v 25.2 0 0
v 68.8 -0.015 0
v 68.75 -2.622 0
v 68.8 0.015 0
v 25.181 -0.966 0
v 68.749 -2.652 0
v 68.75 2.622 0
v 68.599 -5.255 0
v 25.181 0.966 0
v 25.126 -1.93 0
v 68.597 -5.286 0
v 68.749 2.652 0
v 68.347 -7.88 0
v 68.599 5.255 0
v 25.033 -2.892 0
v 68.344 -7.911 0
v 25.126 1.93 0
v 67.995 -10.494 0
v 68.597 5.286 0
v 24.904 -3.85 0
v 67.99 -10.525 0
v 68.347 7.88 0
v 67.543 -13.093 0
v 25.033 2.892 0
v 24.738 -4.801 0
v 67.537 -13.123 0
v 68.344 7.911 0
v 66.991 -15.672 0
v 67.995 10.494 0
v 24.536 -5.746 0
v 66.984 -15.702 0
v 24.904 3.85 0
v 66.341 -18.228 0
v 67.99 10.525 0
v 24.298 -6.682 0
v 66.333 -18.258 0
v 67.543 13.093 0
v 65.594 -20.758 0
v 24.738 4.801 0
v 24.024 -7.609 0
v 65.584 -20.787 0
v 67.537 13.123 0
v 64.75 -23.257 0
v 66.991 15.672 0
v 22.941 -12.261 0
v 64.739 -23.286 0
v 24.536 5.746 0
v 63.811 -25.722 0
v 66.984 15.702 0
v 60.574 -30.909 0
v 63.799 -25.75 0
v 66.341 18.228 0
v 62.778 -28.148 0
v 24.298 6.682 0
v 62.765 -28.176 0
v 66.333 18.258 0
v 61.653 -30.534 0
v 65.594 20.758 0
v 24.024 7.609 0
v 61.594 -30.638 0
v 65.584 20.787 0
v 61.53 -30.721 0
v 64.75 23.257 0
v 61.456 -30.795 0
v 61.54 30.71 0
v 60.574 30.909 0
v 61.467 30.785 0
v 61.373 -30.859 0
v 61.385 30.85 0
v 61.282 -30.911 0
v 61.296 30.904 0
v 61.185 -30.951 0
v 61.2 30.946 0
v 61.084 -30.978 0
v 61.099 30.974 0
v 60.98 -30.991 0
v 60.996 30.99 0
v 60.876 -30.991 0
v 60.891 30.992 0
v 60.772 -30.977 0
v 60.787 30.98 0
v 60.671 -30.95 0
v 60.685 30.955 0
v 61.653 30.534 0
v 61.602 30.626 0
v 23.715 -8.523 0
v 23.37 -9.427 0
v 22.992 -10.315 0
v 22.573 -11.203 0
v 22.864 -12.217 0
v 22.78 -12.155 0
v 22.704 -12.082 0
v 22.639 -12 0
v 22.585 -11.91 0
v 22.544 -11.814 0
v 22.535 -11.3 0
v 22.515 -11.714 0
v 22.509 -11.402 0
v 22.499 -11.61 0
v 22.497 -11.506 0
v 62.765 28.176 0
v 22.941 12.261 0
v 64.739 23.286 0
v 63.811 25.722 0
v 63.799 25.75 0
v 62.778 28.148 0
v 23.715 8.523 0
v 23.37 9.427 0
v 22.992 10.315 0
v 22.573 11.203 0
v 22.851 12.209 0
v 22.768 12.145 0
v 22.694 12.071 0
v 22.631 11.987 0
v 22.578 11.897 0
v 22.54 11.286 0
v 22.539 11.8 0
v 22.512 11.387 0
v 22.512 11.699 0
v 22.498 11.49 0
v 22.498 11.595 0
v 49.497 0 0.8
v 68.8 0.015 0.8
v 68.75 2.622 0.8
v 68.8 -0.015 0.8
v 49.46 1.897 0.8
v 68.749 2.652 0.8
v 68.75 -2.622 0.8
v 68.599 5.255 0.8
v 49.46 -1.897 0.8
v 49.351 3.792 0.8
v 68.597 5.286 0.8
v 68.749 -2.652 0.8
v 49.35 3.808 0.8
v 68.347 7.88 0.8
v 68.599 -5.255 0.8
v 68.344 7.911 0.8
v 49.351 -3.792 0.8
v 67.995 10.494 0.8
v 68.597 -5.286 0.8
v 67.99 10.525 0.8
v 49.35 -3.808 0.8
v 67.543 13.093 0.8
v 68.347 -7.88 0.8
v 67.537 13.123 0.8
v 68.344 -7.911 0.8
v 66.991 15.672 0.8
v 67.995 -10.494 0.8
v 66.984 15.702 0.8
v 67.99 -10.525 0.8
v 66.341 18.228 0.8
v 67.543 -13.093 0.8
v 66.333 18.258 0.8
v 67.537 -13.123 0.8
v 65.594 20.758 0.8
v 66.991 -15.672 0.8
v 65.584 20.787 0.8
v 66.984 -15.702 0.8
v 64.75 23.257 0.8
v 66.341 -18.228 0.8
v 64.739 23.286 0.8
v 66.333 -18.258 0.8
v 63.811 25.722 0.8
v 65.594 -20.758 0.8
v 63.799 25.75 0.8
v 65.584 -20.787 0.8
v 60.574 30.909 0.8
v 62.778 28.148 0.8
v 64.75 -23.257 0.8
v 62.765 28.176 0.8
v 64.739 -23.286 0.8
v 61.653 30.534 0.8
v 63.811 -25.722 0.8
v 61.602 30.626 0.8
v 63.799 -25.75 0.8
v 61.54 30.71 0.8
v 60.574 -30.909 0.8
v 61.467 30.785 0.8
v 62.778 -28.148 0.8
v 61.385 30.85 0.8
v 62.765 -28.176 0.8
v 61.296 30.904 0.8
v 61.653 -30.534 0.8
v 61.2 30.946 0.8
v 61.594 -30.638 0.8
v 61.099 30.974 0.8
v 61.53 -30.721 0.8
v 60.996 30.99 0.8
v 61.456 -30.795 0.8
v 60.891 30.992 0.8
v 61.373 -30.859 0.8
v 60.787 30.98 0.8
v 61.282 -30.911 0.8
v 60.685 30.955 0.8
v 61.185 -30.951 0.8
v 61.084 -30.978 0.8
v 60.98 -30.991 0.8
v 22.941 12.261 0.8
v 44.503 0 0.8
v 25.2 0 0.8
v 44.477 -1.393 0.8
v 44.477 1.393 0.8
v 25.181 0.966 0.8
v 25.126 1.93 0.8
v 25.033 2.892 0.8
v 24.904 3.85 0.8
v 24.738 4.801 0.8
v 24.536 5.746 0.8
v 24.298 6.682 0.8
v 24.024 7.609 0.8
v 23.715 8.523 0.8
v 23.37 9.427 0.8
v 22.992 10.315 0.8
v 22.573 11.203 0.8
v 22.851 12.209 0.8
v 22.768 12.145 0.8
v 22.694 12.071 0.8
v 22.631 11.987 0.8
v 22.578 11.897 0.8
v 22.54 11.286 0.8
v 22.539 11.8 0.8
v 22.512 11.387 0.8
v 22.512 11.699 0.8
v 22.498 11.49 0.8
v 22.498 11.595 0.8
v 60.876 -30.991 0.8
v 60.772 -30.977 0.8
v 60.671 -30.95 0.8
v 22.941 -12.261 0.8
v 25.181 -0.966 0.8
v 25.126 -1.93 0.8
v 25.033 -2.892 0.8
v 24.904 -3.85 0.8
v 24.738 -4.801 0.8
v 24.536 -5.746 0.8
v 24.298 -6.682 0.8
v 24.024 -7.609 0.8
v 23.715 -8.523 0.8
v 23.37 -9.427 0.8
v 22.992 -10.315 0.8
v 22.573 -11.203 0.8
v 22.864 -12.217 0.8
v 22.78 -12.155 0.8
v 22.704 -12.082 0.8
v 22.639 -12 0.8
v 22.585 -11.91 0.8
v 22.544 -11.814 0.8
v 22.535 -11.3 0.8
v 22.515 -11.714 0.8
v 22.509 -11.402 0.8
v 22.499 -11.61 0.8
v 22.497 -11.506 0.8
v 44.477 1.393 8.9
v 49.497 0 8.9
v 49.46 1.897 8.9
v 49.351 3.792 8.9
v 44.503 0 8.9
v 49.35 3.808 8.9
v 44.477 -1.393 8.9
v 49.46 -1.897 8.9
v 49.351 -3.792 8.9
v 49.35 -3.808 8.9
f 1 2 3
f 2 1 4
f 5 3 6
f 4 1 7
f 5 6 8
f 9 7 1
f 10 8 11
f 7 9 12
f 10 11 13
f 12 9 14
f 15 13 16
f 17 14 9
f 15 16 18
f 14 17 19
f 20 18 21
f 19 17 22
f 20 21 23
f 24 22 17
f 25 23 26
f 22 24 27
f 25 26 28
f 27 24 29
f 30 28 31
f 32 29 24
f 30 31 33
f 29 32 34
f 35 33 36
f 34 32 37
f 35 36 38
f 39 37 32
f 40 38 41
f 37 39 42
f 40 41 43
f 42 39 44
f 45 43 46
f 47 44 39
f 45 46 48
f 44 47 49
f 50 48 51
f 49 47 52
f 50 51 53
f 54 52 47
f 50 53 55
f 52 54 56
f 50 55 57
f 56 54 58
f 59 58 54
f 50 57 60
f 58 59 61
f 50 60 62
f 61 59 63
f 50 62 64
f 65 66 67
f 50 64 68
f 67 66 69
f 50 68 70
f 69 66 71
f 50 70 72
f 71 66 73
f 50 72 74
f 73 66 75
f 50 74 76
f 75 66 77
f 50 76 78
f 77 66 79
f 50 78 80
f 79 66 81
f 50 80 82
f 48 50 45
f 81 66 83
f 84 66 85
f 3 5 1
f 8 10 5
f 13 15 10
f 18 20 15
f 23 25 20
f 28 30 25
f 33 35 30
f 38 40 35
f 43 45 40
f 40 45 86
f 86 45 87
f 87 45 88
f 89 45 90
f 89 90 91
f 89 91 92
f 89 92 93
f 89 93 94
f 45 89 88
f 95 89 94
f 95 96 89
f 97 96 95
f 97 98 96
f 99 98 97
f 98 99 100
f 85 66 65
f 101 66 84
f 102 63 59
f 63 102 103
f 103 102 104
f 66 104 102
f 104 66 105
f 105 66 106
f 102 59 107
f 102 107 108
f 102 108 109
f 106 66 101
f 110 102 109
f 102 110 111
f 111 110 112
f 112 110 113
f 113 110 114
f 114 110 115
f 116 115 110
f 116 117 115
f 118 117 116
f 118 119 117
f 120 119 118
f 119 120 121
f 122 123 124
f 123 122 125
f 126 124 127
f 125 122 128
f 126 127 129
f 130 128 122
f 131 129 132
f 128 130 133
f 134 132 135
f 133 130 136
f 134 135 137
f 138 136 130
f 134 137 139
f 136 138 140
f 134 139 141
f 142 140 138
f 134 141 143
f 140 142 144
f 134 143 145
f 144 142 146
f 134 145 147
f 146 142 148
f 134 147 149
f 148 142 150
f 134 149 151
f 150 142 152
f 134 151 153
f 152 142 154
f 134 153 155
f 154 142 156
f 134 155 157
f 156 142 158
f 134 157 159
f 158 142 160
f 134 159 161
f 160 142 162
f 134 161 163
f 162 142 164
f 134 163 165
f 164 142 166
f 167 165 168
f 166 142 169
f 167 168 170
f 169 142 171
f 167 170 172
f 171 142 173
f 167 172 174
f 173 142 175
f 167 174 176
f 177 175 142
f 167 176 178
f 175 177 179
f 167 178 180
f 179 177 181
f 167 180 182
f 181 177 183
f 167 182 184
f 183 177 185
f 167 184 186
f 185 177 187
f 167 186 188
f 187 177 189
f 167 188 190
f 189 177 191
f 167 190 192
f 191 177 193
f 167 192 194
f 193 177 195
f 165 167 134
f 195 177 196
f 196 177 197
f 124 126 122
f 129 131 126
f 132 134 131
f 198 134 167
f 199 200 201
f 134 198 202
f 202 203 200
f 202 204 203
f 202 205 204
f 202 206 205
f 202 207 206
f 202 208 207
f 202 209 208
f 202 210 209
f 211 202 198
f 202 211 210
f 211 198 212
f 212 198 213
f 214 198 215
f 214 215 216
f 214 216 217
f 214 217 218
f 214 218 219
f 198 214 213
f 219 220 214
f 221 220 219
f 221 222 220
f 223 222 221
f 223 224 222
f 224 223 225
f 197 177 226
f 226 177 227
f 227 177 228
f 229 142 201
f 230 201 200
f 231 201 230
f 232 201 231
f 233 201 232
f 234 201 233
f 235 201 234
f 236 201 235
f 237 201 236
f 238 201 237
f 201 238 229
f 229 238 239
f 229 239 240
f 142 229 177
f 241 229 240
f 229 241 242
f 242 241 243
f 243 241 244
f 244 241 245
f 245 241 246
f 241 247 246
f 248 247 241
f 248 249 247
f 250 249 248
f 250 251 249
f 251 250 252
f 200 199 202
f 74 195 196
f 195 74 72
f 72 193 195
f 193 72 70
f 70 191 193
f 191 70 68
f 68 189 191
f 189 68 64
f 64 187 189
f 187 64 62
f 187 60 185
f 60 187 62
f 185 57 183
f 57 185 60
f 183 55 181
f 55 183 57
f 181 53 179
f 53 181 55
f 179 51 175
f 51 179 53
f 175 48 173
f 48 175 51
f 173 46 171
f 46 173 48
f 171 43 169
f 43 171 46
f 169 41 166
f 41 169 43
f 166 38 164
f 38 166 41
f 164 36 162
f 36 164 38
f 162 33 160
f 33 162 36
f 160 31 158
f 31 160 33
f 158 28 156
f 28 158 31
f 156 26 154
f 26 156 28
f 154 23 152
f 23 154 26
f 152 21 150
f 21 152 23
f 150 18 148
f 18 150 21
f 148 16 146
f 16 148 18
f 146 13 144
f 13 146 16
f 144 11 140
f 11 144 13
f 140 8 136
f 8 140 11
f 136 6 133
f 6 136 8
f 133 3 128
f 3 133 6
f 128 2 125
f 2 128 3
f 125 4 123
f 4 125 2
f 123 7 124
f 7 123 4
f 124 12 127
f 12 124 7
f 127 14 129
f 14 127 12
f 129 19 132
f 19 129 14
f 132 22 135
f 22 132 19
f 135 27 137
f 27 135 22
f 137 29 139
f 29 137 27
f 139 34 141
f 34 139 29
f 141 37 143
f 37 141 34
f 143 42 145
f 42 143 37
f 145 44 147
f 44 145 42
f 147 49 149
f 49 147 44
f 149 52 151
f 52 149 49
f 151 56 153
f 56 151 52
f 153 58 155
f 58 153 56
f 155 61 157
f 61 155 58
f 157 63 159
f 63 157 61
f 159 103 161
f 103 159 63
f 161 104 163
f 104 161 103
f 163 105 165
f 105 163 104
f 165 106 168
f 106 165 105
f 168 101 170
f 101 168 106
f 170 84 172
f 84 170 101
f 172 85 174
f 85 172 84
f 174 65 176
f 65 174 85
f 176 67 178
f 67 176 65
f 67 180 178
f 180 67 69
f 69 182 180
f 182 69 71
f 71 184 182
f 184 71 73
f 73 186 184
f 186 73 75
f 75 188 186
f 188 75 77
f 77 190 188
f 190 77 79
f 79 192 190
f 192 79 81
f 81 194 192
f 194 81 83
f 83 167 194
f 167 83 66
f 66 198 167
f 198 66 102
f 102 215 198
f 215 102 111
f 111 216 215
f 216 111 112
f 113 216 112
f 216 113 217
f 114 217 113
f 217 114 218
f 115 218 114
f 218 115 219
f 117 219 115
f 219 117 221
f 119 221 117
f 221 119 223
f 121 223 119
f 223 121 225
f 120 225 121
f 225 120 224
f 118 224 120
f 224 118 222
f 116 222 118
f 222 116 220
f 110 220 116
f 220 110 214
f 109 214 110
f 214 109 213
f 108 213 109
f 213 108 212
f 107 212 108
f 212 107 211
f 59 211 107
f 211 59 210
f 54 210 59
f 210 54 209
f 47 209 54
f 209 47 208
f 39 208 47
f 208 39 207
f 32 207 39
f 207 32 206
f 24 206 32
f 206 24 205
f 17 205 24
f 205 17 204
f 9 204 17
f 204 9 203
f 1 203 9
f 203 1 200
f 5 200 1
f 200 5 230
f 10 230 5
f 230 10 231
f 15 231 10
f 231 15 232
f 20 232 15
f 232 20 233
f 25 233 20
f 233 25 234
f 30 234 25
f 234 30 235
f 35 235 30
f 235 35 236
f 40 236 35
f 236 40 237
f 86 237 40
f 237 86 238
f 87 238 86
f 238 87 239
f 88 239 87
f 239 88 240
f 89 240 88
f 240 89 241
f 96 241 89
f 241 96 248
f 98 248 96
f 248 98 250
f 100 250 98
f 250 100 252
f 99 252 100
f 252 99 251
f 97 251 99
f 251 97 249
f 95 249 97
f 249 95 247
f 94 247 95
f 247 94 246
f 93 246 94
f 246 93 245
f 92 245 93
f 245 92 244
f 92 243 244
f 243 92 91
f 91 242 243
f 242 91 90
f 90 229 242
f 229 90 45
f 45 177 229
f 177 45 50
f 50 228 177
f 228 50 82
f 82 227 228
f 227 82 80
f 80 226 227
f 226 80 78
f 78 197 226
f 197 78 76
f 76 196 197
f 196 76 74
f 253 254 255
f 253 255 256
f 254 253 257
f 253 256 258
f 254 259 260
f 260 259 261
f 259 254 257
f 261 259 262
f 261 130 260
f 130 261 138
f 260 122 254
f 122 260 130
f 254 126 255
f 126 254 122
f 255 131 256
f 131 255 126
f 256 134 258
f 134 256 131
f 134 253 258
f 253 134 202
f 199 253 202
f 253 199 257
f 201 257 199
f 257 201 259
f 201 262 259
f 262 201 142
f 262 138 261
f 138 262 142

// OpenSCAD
// file: parameters.scad
// =============================================================================
// Gen-BS — nightly 2026-10-09 (physics_scorer, honest magpylib watts)
// Pull the whole machine 2 mm inward: poles at R48 (was R50) with 26–68 mm bobbins and an 18.5 mm build. Shorter mean turn length lets each coil hold 612 turns on about 356 m of copper — ~14 m less than Gen-BO, which leaves real slack on a ~390 m spool for leads, a re-wind or a short spool — for about 1.7 % less power. Same Ø134 steel discs as Gen-BO.
// Clocking 0 deg (magnets N facing S) + D-flat keyed bore + index notch + flip-symmetric hole map.
// Windable 2-piece bobbin; turns = physics_scorer turns_fit; copper only between flanges.
// Steel back-iron: 2× Ø134 × 4.76 mm (3/16") mild-steel discs (steel_backiron_disc.dxf); magnets sit ON the steel
// (through-pockets) -> score with --back-iron.
// =============================================================================
topology            = "dual_rotor";

// --- Wire / winding (physics_scorer winding-fit) -------------------------------
wire_awg            = 26;
wire_od             = 0.45;     // insulated OD mm (bare 0.405)
fill_realistic      = 0.65;     // insulated-wire area / window (DENSE layered wind with a jig; scorer cap 0.65)
turns               = 612;       // = physics_scorer turns_fit (do NOT raise)
coil_former_type    = "bobbin";
coil_core_inset     = 18.50;     // radial copper build: hub = copper boundary inset by this
wind_build_axial    = 0.0;      // nothing proud of the flanges
wind_build_radial   = 0.0;

// --- Bobbin (base + lid) ---------------------------------------------------------
coil_id_r           = 26.00;    // copper boundary sector
coil_od_r           = 68.00;
span_deg            = 52.72;    // = pitch - 2*asin((wall+0.85)/coil_id_r) -> >=1.2 mm stator web
former_web          = 8.10;     // copper height between flanges (TALL copper: steel keeps Bz up)
flange_t            = 0.80;     // >= 0.8 mm FDM wall rule (tall winds push on the flanges)
wall                = 0.80;     // flange lip beyond copper
former_bare_h       = former_web + 2 * flange_t;
coil_envelope_h     = former_bare_h + 2 * wind_build_axial;
tab_w               = 7.0;
tab_len             = 7.0;
tab_h               = former_bare_h / 2;
pin_d               = 1.9;      // 1.75 mm filament locating pin
coil_mount_r        = coil_od_r + 0.2 + 4.0;
lead_y              = 1.6;
lead_slot_w         = 0.9;
lead_groove_d       = 0.6;

// --- Gap -------------------------------------------------------------------------
run_clear           = 0.50;     // rotor face -> flange
gap_spacer_h        = run_clear + wind_build_axial;
m2m                 = coil_envelope_h + 2 * run_clear;   // rotor face to rotor face (= gap_sleeve length)

// --- Stator ----------------------------------------------------------------------
coil_stations       = 6;
bay_clear           = 0.25;
stator_thick        = former_bare_h;                        // bobbins flush both faces
stator_od           = 156.0;
shaft_clear_stator  = 14.0;     // stator is static; gap sleeve OD 12 spins inside

// --- Rotor(s) --------------------------------------------------------------------
magnet_Br           = 1.43;     // N52
magnet_d_large      = 20.0;
magnet_h_large      = 5.0;      // one O20x5 per pocket
magnet_h_small      = 5.0;      // one O5x5 per pocket
halbach_magnetisation = "diametric"; // O5x5 assist magnets MUST be DIAMETRICALLY magnetised (tangential)
rotor_b_same_axis   = true;     // same-index magnets share one axis: N faces S across the gap
large_pocket_d      = 20.3;
small_pocket_d      = 5.3;
pocket_h            = 5.00;     // THROUGH the carrier: magnet back face sits on the steel disc (FLUSH seat: carrier = magnet height, magnet face level with the rotor face)
large_n             = 8;
R_large             = 48.0;
R_small_inner       = 41.8;
R_small_mid         = 48.0;
R_small_outer       = 54.2;
small_r_list        = [R_small_inner, R_small_mid, R_small_outer];   // O5 pockets between poles
carrier_od          = 134.0;
carrier_thick       = pocket_h;
hub_h               = 12.0;     // > steel_t + insert: radial set-screw clears the steel
hub_od              = 24.0;     // slim hub so the M4 brace rods fit at R~18 inside the coil ring
hub_insert_d        = 4.0;      // M3 heat-set insert, radial, bears on the D-flat
rotor_b_offset_deg  = 0.0;      // CLOCKING: magnets directly opposite
shaft_key           = "dflat";
dflat_depth         = 0.5;      // 8 mm shaft with 0.5 mm flat (7.5 across flat)
index_notch_d       = 3.0;

// --- Steel back-iron (buyable laser-cut) -------------------------------------------
steel_t             = 4.76;      // mild steel thickness (image method ignores it; sized from steel_flux.py so the return path stays well below saturation)
steel_center_hole   = 26.0;     // slips over the rotor hub (OD 24)
steel_od            = carrier_od;   // steel disc OD = rotor carrier OD

// --- Modular MAX interface ----------------------------------------------------------
shaft_bore          = 8.35;
dflat_x             = 4.0 - dflat_depth + (shaft_bore - 8.0) / 2;
bearing_d           = 21.85;
bearing_h           = 7.2;
m3_clear            = 3.5;
bolt_r_inner        = 30.0;     // M3 steel-disc clamp bolts (inside the magnet ring)
bolt_n_inner        = 4;
bolt_inner_angles   = [0, 90, 180, 270];
bolt_r_outer        = 63.0;     // M3 steel-disc clamp bolts (outside the magnet ring)
bolt_outer_angles   = [45, 135, 225, 315];
flange_bolt_r       = 73.0;     // frame rods: OUTSIDE the rotor OD (rotors spin inside them)
flange_bolt_n       = 6;
flange_bolt_offset  = 30.00;    // between coil stations -> never cuts a lead groove/tab
brace_r             = 18.0;
brace_d             = 4.3;      // temporary M4 jack rods (assembly only)
brace_n             = 4;
brace_angles        = [45, 135, 225, 315];          // flip-symmetric

spacer_pad_od       = 14.0;
spacer_pad_id       = m3_clear;
endbell_od          = 156.0;
endbell_thick       = 8.0;
endbell_shaft_clear = 10.0;
collar_h            = 10.0;
standoff_od         = 9.0;
frame_standoff_h    = run_clear + carrier_thick + hub_h + collar_h + 2.0;
sleeve_od           = 12.0;
plate_max_mm        = 410;

$fn = 64;
// main file
// Gen-BS — bobbin BASE (bottom flange + hub). Print x6, flange down. Wind 26 AWG x 612 t around
// the hub with the LID glued on (coil_lid.stl). Copper lives ONLY between the flanges (no proud winds).
include <parameters.scad>;
$fn = 48;
module sector_2d(r_in, r_out, ang) {
    polygon([
        for (a = [-ang/2 : ang/24 : ang/2]) [r_in*cos(a), r_in*sin(a)],
        for (a = [ang/2 : -ang/24 : -ang/2]) [r_out*cos(a), r_out*sin(a)]
    ]);
}
module footprint_2d() { offset(r=wall) sector_2d(coil_id_r, coil_od_r, span_deg); }
module hub_2d()       { offset(delta=-coil_core_inset) sector_2d(coil_id_r, coil_od_r, span_deg); }

union() {
    linear_extrude(flange_t) footprint_2d();
    translate([0, 0, flange_t - 0.01]) linear_extrude(former_web + 0.01) hub_2d();
}
